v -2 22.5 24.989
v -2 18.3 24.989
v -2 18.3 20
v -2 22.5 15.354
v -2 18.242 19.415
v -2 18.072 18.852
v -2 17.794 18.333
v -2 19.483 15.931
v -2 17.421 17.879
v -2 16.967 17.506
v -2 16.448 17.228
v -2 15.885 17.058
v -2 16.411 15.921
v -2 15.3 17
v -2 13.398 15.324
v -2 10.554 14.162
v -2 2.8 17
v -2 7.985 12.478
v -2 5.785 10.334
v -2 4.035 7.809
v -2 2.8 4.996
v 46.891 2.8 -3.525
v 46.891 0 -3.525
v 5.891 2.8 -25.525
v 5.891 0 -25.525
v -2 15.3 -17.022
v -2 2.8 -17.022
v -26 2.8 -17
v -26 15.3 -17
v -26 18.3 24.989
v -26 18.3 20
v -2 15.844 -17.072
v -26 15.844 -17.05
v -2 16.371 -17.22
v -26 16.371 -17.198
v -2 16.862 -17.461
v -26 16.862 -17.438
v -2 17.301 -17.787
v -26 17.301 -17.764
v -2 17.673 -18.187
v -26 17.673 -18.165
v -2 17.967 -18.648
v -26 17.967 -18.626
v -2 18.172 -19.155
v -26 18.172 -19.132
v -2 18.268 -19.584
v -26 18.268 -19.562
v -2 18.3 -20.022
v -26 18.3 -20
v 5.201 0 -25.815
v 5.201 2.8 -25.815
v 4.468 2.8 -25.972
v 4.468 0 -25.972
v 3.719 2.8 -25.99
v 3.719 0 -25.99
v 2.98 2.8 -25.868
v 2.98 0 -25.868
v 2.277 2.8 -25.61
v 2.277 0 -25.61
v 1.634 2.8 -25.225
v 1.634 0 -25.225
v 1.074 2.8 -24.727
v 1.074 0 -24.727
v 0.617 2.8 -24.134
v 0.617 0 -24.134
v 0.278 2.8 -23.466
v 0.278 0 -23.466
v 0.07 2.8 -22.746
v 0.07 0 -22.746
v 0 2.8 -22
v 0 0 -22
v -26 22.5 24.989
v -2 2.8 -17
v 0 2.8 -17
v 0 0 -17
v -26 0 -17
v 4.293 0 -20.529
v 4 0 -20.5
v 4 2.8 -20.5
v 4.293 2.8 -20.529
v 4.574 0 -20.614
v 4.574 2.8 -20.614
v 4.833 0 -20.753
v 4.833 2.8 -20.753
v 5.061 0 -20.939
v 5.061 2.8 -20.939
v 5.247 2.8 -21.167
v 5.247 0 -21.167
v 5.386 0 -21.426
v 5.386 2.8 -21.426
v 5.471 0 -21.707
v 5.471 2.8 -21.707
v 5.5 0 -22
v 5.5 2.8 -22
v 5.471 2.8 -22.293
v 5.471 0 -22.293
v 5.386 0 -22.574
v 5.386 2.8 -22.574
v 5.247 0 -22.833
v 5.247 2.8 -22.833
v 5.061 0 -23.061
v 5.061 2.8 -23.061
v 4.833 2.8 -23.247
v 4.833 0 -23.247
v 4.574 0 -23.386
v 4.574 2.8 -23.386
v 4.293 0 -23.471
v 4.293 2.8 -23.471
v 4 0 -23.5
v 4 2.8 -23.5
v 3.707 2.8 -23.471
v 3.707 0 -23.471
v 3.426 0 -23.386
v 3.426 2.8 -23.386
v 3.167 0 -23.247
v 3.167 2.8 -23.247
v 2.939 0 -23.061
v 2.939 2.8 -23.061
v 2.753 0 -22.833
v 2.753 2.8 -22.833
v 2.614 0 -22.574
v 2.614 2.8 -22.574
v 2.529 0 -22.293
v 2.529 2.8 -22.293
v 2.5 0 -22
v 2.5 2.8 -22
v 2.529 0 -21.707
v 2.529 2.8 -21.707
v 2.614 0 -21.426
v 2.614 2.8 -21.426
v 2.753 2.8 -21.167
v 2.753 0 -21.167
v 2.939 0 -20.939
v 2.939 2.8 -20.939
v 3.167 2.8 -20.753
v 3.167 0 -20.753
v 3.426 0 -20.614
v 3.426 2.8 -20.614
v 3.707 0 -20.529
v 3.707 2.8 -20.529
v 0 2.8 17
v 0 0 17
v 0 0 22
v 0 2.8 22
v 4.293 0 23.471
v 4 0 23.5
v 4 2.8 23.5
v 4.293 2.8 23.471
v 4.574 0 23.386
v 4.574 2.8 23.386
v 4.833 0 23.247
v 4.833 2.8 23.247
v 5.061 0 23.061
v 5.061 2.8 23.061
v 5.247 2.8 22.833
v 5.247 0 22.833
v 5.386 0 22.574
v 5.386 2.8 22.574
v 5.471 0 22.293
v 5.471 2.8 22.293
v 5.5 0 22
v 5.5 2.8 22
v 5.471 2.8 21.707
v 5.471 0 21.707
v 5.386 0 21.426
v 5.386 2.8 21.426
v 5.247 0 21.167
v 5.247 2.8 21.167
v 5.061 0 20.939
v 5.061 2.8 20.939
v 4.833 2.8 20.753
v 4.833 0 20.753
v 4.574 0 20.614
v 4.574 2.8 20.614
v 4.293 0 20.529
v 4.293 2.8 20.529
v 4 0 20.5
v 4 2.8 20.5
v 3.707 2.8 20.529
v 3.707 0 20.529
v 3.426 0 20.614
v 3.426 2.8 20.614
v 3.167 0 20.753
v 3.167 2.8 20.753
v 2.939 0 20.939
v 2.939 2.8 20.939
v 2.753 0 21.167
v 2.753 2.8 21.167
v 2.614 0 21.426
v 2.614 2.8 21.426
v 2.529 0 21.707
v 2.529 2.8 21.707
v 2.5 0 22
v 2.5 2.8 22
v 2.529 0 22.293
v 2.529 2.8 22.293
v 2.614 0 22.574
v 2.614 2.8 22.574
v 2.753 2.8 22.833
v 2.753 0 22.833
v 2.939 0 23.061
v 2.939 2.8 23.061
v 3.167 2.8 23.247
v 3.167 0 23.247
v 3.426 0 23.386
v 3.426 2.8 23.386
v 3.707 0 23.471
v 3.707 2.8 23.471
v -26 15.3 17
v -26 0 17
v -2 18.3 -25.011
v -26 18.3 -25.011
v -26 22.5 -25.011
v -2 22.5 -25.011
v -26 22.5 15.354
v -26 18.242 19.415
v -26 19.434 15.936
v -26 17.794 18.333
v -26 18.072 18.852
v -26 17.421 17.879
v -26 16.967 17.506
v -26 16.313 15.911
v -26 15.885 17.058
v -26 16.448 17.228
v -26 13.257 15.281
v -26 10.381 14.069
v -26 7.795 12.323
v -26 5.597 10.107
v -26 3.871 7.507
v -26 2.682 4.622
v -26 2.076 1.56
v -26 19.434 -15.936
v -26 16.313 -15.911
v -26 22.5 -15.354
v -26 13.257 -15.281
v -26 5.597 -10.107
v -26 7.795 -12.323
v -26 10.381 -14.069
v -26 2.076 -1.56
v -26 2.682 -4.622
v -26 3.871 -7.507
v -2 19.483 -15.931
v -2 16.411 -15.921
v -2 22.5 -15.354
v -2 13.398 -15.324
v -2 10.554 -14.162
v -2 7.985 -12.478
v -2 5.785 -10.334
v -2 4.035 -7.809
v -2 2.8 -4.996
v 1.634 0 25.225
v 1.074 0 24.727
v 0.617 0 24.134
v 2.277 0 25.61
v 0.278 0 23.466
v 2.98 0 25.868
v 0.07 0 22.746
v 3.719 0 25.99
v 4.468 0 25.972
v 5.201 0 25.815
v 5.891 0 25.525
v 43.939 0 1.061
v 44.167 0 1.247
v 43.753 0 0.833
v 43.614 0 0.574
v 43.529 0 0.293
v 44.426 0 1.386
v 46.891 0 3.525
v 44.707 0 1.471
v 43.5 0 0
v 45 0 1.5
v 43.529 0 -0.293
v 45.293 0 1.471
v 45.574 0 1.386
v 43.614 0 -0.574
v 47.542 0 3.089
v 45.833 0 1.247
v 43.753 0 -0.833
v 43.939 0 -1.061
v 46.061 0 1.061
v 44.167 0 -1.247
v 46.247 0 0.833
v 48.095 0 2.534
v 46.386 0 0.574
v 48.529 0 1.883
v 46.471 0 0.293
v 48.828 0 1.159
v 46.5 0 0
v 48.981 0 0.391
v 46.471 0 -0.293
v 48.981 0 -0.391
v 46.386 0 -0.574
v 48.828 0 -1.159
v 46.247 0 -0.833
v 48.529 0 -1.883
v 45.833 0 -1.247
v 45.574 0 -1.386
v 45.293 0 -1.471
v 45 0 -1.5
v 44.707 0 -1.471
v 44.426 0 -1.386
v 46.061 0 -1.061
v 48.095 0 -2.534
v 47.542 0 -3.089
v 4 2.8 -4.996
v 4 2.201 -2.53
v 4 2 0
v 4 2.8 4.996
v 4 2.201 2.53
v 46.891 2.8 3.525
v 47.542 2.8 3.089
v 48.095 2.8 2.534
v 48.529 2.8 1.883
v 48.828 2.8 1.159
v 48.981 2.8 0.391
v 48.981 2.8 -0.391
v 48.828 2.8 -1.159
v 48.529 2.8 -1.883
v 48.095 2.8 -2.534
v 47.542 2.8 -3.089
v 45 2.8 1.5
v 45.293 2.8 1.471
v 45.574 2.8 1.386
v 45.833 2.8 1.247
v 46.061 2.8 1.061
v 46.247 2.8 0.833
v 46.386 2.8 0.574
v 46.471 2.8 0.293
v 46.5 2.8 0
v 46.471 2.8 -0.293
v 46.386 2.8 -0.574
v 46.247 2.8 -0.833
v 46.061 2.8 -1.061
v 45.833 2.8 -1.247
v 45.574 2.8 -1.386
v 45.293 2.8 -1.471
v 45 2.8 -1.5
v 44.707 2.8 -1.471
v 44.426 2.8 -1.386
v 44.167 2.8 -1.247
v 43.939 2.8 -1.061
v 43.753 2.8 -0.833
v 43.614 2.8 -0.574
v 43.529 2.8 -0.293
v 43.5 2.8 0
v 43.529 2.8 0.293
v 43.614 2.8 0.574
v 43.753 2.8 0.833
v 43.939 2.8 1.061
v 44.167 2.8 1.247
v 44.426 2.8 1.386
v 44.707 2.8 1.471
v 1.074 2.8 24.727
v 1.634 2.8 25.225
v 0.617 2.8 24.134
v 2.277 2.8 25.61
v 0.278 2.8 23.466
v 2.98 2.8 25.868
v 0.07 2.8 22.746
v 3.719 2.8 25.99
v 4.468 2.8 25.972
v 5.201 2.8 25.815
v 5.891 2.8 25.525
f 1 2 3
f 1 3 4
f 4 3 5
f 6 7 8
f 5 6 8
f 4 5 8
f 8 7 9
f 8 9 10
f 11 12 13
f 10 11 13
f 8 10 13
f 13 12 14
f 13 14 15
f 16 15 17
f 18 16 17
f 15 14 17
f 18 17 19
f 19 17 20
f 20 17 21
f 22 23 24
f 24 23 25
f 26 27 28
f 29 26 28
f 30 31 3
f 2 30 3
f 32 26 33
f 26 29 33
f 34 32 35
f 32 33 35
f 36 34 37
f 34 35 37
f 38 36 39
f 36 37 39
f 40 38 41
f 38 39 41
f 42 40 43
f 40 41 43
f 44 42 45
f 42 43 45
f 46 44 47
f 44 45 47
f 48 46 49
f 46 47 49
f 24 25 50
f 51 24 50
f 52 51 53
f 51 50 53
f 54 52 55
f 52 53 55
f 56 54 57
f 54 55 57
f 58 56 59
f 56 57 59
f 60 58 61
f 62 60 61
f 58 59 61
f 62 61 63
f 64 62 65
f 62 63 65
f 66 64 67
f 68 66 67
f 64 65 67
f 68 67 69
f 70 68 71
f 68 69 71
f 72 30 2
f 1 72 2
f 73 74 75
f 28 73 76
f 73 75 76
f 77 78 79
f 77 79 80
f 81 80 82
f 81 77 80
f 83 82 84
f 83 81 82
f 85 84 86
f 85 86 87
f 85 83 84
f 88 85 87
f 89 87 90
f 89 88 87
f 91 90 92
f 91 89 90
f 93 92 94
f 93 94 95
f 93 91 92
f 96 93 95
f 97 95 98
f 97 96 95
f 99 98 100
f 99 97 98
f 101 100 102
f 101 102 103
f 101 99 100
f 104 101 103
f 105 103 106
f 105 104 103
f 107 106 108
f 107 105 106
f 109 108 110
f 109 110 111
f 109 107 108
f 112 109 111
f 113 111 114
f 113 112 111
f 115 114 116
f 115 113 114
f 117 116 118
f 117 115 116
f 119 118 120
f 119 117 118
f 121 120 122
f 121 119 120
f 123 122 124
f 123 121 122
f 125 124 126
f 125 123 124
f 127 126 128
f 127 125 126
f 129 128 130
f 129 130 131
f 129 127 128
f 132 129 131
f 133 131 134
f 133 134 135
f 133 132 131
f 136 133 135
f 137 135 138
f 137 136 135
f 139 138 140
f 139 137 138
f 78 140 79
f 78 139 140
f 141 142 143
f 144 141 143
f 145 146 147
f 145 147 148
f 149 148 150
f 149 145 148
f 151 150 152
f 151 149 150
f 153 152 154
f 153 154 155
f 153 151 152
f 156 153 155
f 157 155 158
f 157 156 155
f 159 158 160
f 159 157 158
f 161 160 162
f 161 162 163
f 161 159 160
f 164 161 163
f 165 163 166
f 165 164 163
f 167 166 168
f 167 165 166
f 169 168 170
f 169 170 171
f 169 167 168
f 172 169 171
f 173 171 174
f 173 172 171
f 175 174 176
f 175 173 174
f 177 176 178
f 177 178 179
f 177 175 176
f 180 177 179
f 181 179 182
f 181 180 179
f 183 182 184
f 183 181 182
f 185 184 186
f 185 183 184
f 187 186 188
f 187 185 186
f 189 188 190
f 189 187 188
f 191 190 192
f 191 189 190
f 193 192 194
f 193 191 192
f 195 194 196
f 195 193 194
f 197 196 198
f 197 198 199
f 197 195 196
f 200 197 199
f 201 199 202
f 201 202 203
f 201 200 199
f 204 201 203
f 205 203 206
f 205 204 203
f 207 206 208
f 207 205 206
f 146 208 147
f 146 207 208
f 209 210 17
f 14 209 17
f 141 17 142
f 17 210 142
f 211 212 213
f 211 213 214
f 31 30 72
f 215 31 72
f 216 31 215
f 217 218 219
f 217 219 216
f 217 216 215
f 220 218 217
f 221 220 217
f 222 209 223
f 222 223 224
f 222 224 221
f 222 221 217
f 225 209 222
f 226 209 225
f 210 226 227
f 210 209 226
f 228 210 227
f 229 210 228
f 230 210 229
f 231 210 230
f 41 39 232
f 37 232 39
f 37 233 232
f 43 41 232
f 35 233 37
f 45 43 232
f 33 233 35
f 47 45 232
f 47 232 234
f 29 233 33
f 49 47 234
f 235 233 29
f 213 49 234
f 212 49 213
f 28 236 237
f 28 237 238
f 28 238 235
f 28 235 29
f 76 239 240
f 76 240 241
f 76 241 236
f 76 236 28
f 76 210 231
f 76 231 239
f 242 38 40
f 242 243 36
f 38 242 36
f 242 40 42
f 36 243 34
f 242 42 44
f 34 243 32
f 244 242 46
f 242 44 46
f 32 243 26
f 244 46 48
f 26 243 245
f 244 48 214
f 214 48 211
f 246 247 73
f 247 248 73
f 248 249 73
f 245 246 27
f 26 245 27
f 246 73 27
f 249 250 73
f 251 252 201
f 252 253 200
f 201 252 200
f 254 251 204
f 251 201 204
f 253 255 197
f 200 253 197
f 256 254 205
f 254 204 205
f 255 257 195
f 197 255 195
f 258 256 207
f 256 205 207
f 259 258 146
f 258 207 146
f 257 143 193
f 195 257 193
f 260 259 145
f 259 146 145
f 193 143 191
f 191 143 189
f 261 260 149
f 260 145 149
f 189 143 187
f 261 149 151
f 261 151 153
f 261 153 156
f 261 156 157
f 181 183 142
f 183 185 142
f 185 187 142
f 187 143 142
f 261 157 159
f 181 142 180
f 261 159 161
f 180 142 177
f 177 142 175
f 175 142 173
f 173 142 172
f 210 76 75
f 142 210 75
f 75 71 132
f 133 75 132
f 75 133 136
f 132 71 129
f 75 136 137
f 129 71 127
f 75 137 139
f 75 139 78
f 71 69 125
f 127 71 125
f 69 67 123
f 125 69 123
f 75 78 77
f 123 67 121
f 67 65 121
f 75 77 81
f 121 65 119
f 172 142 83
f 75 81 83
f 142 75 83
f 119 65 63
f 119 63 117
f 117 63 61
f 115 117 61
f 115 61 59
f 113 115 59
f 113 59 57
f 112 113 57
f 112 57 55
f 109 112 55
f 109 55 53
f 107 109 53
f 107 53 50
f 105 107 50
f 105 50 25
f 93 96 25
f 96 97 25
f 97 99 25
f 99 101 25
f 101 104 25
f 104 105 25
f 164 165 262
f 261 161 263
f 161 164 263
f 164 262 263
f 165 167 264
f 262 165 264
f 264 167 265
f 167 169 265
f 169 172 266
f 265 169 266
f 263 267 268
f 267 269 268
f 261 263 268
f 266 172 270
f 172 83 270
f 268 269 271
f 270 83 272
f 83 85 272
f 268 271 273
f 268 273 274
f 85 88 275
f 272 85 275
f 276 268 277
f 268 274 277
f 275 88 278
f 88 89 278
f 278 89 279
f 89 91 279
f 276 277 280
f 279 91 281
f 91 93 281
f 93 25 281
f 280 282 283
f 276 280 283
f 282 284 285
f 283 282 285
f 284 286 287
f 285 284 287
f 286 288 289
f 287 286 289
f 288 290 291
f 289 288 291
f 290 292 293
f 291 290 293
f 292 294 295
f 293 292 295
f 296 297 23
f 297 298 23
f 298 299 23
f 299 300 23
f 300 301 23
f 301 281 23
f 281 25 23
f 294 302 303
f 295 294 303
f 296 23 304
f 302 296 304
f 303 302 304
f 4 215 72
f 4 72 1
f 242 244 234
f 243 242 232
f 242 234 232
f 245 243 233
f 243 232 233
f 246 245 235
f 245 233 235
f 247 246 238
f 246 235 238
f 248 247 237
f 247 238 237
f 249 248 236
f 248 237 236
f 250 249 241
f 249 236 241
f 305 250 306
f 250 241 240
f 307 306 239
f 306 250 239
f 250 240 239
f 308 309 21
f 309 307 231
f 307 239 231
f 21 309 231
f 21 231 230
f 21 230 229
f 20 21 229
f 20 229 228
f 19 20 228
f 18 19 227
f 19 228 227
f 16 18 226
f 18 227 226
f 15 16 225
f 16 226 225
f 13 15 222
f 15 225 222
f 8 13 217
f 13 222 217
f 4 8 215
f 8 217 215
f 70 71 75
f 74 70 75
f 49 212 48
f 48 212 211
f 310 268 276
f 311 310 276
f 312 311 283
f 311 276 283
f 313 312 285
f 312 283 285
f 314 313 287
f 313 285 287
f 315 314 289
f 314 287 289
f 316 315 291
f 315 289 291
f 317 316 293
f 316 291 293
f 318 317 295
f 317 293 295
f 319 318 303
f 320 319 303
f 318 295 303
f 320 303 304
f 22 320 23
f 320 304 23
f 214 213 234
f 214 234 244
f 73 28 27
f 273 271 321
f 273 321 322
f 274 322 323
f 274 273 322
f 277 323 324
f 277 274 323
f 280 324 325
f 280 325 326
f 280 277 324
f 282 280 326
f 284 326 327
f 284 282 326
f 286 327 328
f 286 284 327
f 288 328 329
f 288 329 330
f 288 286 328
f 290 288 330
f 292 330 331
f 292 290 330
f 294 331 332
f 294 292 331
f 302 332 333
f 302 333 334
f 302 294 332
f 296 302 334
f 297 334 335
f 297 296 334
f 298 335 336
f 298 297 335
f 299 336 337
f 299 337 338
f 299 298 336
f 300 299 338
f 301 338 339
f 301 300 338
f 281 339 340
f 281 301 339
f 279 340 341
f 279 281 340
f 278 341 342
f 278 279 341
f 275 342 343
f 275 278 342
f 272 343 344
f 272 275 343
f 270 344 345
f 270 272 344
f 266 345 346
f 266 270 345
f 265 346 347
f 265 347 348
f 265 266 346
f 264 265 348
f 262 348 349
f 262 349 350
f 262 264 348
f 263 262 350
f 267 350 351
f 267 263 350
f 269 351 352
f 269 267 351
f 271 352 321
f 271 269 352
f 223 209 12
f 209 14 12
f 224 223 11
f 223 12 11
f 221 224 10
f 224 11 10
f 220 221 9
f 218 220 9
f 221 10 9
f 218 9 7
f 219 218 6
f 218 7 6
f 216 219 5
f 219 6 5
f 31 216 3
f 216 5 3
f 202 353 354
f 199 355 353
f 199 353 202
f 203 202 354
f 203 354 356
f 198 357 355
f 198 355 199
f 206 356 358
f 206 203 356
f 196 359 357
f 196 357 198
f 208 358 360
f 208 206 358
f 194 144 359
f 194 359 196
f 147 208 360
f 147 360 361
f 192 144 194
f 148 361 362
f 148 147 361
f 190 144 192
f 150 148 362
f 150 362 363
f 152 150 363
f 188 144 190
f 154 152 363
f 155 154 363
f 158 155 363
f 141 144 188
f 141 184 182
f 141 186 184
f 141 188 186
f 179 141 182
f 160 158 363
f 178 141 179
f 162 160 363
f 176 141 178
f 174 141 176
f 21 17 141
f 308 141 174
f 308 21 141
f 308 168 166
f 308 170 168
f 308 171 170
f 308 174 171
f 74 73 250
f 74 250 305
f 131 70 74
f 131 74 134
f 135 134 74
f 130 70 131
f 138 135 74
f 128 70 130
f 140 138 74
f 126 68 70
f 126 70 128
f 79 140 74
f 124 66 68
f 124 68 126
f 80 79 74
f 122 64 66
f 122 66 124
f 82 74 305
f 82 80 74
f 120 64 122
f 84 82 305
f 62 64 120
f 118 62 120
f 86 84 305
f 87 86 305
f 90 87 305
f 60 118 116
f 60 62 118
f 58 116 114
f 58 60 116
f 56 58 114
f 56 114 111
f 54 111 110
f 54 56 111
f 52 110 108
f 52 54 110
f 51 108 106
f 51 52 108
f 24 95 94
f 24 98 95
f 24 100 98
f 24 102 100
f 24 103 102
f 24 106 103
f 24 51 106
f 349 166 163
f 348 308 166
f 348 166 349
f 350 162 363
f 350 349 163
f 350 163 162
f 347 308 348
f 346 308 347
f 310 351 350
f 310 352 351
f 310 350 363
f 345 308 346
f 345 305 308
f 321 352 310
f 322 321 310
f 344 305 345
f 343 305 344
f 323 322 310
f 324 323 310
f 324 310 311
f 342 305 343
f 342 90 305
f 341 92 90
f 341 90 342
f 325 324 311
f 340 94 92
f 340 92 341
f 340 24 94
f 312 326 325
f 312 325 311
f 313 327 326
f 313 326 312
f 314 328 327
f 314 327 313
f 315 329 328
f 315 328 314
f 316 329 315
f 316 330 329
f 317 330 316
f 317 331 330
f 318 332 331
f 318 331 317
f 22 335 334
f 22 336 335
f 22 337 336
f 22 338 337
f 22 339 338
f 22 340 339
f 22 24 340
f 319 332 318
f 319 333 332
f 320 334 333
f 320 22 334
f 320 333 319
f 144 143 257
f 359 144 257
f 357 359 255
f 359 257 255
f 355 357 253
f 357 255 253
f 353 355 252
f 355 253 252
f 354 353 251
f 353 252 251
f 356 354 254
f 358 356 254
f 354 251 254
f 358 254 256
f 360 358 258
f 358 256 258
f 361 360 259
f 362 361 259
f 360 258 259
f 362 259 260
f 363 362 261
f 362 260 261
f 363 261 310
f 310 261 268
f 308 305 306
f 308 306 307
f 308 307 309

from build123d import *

# Parameters (mm, degrees)
SKETCH_1_R          = 1.5
EXTRUDE_1_DEPTH     = 2.8
EXTRUDE_2_DEPTH     = 15.5
SKETCH_3_W          = 24
SKETCH_3_H          = 50
EXTRUDE_3_DEPTH     = 4.2
SKETCH_4_R          = 16
CUT_EXTRUDE_4_DEPTH = 30
FILLET_1_R          = 3


with BuildPart() as part:
    # Эскиз1 → Вытянуть1 (new body)
    with BuildSketch(Plane(origin=(0, 0, 0), x_dir=(1, 0, 0), z_dir=(0, 1, 0))):
        with BuildLine():
            Line((0, 22), (0, 17))
            Line((0, 17), (-26, 17))
            Line((-26, 17), (-26, 0))
            Line((-26, 0), (-26, -17))
            Line((-26, -17), (0, -17))
            Line((0, -17), (0, -22))
            ThreePointArc((0, -22), (1.94635486, -25.432570704), (5.891270819, -25.524641072))
            Line((5.891270819, -25.524641072), (46.891270819, -3.524641072))
            ThreePointArc((46.891270819, -3.524641072), (49, 0), (46.891270819, 3.524641072))
            Line((46.891270819, 3.524641072), (5.891270819, 25.524641072))
            ThreePointArc((5.891270819, 25.524641072), (1.94635486, 25.432570704), (0, 22))
        make_face()
        with Locations(Location((4, 22, 0), (0, 0, 270))):
            Circle(SKETCH_1_R, mode=Mode.SUBTRACT)
        with Locations(Location((4, -22, 0), (0, 0, 270))):
            Circle(SKETCH_1_R, mode=Mode.SUBTRACT)
        with Locations(Location((45, 0, 0), (0, 0, 270))):
            Circle(SKETCH_1_R, mode=Mode.SUBTRACT)
    extrude(amount=EXTRUDE_1_DEPTH)

    # Эскиз2 → Вытянуть2 (add)
    with BuildSketch(Plane(origin=(0, 2.8, 0), x_dir=(1, 0, 0), z_dir=(0, 1, 0))):
        Polygon((-2, 17.022348164), (-26, 17), (-26, -17), (-2, -17), align=None)
    extrude(amount=EXTRUDE_2_DEPTH)

    # Эскиз3 → Вытянуть3 (add)
    with BuildSketch(Plane(origin=(0, 18.3, 0), x_dir=(1, 0, 0), z_dir=(0, 1, 0))):
        with Locations((-14, 0.011174082)):
            Rectangle(SKETCH_3_W, SKETCH_3_H)
    extrude(amount=EXTRUDE_3_DEPTH)

    # Эскиз4 → Вытянуть4 (cut)
    with BuildSketch(Plane.ZY.offset(26)):
        with Locations((0, 18)):
            Circle(SKETCH_4_R)
    extrude(amount=-CUT_EXTRUDE_4_DEPTH, mode=Mode.SUBTRACT)

    # Скругление1
    fillet_1_edges = [part.edges().sort_by_distance(p)[0] for p in [
        (-14, 18.3, -17.011174082),
        (-14, 18.3, 17),
    ]]
    fillet(fillet_1_edges, radius=FILLET_1_R)


solid = part.part
